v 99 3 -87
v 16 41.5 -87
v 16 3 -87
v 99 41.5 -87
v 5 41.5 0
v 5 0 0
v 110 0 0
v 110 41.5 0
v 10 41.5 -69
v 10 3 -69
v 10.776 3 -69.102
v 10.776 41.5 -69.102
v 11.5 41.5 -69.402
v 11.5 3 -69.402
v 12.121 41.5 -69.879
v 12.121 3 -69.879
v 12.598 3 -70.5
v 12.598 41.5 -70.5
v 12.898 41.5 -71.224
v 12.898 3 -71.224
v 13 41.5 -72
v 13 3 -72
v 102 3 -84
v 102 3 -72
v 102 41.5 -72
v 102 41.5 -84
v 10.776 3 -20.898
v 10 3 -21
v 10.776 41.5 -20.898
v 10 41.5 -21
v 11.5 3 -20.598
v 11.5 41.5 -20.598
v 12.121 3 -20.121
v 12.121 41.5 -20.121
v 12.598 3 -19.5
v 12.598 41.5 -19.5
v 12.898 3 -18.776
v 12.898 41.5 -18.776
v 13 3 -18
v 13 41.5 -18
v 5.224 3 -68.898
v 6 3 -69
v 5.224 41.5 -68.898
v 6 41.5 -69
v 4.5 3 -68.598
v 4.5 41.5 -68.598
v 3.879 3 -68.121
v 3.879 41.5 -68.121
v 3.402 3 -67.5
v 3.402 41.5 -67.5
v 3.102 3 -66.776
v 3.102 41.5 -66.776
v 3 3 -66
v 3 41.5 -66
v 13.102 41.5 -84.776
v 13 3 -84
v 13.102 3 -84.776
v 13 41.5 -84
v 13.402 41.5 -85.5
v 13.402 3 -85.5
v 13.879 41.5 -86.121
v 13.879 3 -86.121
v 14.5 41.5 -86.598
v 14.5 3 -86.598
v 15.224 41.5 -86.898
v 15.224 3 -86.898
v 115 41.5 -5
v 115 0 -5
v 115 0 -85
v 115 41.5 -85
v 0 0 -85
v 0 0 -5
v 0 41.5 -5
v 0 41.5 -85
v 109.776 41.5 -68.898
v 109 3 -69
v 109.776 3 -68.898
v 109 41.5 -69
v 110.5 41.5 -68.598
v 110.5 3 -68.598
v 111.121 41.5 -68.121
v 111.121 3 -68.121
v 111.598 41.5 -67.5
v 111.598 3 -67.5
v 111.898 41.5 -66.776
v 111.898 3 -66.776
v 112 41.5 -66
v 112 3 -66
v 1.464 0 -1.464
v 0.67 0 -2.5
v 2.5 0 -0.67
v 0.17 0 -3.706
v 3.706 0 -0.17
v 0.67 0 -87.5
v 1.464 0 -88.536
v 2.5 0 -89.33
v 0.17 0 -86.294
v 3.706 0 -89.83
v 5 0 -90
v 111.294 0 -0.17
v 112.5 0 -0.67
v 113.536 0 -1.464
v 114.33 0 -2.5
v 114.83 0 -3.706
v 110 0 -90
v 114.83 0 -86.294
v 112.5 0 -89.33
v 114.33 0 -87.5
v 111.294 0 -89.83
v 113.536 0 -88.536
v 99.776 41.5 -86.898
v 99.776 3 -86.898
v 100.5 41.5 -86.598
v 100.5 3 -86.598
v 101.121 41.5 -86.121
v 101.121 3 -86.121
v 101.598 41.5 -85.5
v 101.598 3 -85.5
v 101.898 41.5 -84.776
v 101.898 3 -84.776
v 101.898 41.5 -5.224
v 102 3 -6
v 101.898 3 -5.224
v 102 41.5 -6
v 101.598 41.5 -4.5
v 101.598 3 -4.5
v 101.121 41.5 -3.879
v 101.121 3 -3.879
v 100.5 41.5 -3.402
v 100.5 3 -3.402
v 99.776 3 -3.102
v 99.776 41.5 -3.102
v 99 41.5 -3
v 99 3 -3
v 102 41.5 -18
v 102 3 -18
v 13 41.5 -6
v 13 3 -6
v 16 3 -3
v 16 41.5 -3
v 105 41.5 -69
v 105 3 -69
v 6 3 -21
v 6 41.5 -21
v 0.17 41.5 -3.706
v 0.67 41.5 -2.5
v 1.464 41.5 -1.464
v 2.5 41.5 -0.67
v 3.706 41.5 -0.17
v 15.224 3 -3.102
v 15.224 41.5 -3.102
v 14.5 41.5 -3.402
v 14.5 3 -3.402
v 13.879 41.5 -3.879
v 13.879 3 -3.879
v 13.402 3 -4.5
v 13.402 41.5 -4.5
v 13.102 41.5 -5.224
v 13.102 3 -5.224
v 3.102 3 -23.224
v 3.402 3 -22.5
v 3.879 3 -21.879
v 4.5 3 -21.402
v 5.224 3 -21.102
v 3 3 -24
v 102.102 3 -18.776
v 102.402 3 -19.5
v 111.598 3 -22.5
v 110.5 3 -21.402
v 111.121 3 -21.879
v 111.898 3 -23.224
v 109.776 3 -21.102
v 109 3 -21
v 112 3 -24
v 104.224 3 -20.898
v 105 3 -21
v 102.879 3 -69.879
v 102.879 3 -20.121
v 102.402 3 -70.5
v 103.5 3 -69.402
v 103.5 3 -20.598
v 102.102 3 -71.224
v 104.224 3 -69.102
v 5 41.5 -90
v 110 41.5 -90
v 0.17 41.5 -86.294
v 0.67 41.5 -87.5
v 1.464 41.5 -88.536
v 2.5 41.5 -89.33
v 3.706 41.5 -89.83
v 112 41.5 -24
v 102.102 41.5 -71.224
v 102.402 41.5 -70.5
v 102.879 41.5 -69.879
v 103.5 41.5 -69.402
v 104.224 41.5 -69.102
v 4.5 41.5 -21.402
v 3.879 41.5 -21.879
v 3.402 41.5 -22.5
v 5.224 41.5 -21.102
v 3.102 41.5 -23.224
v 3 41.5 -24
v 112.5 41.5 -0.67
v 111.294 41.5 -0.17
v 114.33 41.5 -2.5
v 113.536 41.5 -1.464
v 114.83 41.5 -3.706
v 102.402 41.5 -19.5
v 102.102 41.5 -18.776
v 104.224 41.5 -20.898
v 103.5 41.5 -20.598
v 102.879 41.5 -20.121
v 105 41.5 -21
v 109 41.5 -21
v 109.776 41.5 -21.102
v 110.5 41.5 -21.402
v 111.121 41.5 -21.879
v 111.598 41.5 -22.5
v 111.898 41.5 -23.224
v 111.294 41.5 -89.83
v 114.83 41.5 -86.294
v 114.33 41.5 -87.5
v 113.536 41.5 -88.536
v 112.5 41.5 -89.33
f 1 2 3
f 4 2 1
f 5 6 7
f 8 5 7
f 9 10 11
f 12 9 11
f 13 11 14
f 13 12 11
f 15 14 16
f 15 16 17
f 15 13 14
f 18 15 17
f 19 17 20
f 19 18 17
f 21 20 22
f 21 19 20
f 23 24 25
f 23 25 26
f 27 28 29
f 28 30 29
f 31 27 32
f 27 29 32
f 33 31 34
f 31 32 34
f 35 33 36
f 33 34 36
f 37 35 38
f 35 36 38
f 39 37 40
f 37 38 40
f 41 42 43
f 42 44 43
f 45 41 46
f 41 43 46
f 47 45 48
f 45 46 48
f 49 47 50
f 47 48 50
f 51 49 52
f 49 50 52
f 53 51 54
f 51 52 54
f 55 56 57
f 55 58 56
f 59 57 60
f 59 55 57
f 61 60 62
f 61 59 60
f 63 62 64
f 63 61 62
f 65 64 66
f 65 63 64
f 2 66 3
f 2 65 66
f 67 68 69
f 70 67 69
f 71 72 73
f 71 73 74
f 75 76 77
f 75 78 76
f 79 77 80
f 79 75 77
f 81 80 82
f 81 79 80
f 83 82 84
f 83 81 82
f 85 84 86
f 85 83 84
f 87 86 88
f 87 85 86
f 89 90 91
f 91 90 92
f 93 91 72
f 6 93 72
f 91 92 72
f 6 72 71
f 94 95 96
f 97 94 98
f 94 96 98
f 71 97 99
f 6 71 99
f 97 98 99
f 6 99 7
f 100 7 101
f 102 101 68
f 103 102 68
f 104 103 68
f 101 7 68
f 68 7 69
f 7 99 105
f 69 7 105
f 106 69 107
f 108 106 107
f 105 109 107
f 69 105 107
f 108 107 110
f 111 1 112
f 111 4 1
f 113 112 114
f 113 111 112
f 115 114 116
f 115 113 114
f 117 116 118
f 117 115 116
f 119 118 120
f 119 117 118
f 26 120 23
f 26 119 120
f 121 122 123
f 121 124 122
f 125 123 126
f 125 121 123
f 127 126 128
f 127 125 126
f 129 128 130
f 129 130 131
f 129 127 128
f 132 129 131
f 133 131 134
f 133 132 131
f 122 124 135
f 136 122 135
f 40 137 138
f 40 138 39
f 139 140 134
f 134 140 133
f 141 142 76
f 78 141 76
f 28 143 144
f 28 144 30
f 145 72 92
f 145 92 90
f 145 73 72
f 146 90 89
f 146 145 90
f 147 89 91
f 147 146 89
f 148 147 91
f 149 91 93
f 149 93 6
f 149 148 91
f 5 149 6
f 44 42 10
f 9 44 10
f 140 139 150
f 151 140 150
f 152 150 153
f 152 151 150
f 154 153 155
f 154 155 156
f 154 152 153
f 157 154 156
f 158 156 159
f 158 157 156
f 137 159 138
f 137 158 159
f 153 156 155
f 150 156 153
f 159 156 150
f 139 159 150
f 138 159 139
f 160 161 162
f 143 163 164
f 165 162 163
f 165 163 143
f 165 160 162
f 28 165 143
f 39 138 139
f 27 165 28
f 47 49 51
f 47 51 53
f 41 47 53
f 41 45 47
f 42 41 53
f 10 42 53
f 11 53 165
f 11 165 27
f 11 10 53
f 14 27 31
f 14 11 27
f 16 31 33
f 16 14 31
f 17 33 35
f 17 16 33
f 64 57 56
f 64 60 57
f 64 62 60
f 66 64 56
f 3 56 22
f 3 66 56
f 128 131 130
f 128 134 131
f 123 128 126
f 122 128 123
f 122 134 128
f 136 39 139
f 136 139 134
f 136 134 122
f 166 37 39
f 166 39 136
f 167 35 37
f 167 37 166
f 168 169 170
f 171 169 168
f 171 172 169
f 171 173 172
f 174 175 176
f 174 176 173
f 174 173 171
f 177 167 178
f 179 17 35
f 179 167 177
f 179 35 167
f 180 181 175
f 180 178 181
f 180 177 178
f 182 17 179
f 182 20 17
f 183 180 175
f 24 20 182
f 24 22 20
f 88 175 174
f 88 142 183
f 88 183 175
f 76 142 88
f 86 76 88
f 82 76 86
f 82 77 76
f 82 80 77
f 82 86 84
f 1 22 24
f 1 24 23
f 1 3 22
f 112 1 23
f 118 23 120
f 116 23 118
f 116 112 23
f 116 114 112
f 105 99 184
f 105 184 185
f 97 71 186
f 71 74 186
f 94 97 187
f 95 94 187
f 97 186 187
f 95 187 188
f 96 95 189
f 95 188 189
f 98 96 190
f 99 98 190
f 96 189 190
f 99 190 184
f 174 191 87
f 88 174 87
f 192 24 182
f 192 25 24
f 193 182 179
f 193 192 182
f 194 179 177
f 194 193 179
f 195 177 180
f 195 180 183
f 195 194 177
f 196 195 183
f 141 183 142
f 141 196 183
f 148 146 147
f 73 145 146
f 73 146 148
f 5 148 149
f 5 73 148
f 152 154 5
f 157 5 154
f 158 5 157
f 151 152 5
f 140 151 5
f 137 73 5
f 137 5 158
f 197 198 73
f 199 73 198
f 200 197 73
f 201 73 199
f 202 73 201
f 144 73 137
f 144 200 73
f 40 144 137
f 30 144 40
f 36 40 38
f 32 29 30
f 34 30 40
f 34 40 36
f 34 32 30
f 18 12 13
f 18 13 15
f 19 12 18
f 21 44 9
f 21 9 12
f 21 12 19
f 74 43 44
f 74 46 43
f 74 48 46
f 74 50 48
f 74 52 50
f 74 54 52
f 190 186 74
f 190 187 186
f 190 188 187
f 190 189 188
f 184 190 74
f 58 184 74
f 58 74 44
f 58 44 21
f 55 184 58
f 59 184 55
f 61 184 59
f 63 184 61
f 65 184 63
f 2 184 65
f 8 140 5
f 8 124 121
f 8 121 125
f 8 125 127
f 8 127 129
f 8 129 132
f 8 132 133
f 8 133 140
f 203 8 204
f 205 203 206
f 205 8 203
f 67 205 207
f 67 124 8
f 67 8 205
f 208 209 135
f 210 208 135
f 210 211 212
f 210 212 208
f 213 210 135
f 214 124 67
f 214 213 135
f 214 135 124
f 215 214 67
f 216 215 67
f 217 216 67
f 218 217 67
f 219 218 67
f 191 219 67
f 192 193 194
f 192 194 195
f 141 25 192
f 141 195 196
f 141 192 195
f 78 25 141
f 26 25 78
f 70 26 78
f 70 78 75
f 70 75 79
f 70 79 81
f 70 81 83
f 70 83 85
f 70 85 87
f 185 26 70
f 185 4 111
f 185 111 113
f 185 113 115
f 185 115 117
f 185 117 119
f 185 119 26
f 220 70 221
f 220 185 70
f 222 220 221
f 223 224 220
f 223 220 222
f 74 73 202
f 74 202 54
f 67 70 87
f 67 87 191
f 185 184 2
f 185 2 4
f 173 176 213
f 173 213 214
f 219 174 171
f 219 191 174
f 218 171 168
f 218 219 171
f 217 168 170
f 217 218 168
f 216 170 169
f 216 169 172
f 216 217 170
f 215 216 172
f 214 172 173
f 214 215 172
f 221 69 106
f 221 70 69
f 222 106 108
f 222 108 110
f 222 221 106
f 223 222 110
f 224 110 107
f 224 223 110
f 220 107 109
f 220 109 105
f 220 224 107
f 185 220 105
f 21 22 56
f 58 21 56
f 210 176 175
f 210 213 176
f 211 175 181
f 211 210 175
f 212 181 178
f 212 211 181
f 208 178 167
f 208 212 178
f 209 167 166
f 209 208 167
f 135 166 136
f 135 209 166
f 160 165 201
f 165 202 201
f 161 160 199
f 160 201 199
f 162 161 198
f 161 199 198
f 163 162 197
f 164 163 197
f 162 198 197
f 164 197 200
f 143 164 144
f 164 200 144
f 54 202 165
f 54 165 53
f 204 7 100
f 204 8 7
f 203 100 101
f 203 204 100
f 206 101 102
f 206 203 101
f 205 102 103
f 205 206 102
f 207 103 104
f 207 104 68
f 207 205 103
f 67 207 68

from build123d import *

# Parameters (mm, degrees)
SKETCH1_W           = 115
SKETCH1_H           = 90
BOSS_EXTRUDE1_DEPTH = 41.5
SKETCH3_W           = 109
SKETCH3_H           = 84
CUT_EXTRUDE1_DEPTH  = 38.5
SKETCH4_W           = 10
SKETCH4_H           = 18
BOSS_EXTRUDE2_DEPTH = 38.5
FILLET1_R           = 3
FILLET2_R           = 5


with BuildPart() as part:
    # Sketch1 → Boss-Extrude1 (new body)
    with BuildSketch(Plane(origin=(0, 0, 0), x_dir=(1, 0, 0), z_dir=(0, 1, 0))):
        with Locations((57.5, 45)):
            Rectangle(SKETCH1_W, SKETCH1_H)
    extrude(amount=BOSS_EXTRUDE1_DEPTH)

    # Sketch3 → Cut-Extrude1 (cut)
    with BuildSketch(Plane(origin=(0, 41.5, 0), x_dir=(1, 0, 0), z_dir=(0, 1, 0))):
        with Locations((57.5, 45)):
            Rectangle(SKETCH3_W, SKETCH3_H)
    extrude(amount=-CUT_EXTRUDE1_DEPTH, mode=Mode.SUBTRACT)

    # Sketch4 → Boss-Extrude2 (add)
    with BuildSketch(Plane(origin=(0, 3, 0), x_dir=(1, 0, 0), z_dir=(0, 1, 0))):
        with Locations((8, 78)):
            Rectangle(SKETCH4_W, SKETCH4_H)
        with Locations((107, 78)):
            Rectangle(SKETCH4_W, SKETCH4_H)
        with Locations((107, 12)):
            Rectangle(SKETCH4_W, SKETCH4_H)
        with Locations((8, 12)):
            Rectangle(SKETCH4_W, SKETCH4_H)
    extrude(amount=BOSS_EXTRUDE2_DEPTH)

    # Fillet1
    fillet1_edges = [part.edges().sort_by_distance(p)[0] for p in [
        (13, 22.25, -87),
        (13, 22.25, -69),
        (3, 22.25, -69),
        (102, 22.25, -69),
        (102, 22.25, -87),
        (112, 22.25, -69),
        (102, 22.25, -21),
        (112, 22.25, -21),
        (102, 22.25, -3),
        (13, 22.25, -21),
        (13, 22.25, -3),
        (3, 22.25, -21),
    ]]
    fillet(fillet1_edges, radius=FILLET1_R)

    # Fillet2
    fillet2_edges = [part.edges().sort_by_distance(p)[0] for p in [
        (0, 20.75, -90),
        (115, 20.75, -90),
        (115, 20.75, 0),
        (0, 20.75, 0),
    ]]
    fillet(fillet2_edges, radius=FILLET2_R)


solid = part.part
